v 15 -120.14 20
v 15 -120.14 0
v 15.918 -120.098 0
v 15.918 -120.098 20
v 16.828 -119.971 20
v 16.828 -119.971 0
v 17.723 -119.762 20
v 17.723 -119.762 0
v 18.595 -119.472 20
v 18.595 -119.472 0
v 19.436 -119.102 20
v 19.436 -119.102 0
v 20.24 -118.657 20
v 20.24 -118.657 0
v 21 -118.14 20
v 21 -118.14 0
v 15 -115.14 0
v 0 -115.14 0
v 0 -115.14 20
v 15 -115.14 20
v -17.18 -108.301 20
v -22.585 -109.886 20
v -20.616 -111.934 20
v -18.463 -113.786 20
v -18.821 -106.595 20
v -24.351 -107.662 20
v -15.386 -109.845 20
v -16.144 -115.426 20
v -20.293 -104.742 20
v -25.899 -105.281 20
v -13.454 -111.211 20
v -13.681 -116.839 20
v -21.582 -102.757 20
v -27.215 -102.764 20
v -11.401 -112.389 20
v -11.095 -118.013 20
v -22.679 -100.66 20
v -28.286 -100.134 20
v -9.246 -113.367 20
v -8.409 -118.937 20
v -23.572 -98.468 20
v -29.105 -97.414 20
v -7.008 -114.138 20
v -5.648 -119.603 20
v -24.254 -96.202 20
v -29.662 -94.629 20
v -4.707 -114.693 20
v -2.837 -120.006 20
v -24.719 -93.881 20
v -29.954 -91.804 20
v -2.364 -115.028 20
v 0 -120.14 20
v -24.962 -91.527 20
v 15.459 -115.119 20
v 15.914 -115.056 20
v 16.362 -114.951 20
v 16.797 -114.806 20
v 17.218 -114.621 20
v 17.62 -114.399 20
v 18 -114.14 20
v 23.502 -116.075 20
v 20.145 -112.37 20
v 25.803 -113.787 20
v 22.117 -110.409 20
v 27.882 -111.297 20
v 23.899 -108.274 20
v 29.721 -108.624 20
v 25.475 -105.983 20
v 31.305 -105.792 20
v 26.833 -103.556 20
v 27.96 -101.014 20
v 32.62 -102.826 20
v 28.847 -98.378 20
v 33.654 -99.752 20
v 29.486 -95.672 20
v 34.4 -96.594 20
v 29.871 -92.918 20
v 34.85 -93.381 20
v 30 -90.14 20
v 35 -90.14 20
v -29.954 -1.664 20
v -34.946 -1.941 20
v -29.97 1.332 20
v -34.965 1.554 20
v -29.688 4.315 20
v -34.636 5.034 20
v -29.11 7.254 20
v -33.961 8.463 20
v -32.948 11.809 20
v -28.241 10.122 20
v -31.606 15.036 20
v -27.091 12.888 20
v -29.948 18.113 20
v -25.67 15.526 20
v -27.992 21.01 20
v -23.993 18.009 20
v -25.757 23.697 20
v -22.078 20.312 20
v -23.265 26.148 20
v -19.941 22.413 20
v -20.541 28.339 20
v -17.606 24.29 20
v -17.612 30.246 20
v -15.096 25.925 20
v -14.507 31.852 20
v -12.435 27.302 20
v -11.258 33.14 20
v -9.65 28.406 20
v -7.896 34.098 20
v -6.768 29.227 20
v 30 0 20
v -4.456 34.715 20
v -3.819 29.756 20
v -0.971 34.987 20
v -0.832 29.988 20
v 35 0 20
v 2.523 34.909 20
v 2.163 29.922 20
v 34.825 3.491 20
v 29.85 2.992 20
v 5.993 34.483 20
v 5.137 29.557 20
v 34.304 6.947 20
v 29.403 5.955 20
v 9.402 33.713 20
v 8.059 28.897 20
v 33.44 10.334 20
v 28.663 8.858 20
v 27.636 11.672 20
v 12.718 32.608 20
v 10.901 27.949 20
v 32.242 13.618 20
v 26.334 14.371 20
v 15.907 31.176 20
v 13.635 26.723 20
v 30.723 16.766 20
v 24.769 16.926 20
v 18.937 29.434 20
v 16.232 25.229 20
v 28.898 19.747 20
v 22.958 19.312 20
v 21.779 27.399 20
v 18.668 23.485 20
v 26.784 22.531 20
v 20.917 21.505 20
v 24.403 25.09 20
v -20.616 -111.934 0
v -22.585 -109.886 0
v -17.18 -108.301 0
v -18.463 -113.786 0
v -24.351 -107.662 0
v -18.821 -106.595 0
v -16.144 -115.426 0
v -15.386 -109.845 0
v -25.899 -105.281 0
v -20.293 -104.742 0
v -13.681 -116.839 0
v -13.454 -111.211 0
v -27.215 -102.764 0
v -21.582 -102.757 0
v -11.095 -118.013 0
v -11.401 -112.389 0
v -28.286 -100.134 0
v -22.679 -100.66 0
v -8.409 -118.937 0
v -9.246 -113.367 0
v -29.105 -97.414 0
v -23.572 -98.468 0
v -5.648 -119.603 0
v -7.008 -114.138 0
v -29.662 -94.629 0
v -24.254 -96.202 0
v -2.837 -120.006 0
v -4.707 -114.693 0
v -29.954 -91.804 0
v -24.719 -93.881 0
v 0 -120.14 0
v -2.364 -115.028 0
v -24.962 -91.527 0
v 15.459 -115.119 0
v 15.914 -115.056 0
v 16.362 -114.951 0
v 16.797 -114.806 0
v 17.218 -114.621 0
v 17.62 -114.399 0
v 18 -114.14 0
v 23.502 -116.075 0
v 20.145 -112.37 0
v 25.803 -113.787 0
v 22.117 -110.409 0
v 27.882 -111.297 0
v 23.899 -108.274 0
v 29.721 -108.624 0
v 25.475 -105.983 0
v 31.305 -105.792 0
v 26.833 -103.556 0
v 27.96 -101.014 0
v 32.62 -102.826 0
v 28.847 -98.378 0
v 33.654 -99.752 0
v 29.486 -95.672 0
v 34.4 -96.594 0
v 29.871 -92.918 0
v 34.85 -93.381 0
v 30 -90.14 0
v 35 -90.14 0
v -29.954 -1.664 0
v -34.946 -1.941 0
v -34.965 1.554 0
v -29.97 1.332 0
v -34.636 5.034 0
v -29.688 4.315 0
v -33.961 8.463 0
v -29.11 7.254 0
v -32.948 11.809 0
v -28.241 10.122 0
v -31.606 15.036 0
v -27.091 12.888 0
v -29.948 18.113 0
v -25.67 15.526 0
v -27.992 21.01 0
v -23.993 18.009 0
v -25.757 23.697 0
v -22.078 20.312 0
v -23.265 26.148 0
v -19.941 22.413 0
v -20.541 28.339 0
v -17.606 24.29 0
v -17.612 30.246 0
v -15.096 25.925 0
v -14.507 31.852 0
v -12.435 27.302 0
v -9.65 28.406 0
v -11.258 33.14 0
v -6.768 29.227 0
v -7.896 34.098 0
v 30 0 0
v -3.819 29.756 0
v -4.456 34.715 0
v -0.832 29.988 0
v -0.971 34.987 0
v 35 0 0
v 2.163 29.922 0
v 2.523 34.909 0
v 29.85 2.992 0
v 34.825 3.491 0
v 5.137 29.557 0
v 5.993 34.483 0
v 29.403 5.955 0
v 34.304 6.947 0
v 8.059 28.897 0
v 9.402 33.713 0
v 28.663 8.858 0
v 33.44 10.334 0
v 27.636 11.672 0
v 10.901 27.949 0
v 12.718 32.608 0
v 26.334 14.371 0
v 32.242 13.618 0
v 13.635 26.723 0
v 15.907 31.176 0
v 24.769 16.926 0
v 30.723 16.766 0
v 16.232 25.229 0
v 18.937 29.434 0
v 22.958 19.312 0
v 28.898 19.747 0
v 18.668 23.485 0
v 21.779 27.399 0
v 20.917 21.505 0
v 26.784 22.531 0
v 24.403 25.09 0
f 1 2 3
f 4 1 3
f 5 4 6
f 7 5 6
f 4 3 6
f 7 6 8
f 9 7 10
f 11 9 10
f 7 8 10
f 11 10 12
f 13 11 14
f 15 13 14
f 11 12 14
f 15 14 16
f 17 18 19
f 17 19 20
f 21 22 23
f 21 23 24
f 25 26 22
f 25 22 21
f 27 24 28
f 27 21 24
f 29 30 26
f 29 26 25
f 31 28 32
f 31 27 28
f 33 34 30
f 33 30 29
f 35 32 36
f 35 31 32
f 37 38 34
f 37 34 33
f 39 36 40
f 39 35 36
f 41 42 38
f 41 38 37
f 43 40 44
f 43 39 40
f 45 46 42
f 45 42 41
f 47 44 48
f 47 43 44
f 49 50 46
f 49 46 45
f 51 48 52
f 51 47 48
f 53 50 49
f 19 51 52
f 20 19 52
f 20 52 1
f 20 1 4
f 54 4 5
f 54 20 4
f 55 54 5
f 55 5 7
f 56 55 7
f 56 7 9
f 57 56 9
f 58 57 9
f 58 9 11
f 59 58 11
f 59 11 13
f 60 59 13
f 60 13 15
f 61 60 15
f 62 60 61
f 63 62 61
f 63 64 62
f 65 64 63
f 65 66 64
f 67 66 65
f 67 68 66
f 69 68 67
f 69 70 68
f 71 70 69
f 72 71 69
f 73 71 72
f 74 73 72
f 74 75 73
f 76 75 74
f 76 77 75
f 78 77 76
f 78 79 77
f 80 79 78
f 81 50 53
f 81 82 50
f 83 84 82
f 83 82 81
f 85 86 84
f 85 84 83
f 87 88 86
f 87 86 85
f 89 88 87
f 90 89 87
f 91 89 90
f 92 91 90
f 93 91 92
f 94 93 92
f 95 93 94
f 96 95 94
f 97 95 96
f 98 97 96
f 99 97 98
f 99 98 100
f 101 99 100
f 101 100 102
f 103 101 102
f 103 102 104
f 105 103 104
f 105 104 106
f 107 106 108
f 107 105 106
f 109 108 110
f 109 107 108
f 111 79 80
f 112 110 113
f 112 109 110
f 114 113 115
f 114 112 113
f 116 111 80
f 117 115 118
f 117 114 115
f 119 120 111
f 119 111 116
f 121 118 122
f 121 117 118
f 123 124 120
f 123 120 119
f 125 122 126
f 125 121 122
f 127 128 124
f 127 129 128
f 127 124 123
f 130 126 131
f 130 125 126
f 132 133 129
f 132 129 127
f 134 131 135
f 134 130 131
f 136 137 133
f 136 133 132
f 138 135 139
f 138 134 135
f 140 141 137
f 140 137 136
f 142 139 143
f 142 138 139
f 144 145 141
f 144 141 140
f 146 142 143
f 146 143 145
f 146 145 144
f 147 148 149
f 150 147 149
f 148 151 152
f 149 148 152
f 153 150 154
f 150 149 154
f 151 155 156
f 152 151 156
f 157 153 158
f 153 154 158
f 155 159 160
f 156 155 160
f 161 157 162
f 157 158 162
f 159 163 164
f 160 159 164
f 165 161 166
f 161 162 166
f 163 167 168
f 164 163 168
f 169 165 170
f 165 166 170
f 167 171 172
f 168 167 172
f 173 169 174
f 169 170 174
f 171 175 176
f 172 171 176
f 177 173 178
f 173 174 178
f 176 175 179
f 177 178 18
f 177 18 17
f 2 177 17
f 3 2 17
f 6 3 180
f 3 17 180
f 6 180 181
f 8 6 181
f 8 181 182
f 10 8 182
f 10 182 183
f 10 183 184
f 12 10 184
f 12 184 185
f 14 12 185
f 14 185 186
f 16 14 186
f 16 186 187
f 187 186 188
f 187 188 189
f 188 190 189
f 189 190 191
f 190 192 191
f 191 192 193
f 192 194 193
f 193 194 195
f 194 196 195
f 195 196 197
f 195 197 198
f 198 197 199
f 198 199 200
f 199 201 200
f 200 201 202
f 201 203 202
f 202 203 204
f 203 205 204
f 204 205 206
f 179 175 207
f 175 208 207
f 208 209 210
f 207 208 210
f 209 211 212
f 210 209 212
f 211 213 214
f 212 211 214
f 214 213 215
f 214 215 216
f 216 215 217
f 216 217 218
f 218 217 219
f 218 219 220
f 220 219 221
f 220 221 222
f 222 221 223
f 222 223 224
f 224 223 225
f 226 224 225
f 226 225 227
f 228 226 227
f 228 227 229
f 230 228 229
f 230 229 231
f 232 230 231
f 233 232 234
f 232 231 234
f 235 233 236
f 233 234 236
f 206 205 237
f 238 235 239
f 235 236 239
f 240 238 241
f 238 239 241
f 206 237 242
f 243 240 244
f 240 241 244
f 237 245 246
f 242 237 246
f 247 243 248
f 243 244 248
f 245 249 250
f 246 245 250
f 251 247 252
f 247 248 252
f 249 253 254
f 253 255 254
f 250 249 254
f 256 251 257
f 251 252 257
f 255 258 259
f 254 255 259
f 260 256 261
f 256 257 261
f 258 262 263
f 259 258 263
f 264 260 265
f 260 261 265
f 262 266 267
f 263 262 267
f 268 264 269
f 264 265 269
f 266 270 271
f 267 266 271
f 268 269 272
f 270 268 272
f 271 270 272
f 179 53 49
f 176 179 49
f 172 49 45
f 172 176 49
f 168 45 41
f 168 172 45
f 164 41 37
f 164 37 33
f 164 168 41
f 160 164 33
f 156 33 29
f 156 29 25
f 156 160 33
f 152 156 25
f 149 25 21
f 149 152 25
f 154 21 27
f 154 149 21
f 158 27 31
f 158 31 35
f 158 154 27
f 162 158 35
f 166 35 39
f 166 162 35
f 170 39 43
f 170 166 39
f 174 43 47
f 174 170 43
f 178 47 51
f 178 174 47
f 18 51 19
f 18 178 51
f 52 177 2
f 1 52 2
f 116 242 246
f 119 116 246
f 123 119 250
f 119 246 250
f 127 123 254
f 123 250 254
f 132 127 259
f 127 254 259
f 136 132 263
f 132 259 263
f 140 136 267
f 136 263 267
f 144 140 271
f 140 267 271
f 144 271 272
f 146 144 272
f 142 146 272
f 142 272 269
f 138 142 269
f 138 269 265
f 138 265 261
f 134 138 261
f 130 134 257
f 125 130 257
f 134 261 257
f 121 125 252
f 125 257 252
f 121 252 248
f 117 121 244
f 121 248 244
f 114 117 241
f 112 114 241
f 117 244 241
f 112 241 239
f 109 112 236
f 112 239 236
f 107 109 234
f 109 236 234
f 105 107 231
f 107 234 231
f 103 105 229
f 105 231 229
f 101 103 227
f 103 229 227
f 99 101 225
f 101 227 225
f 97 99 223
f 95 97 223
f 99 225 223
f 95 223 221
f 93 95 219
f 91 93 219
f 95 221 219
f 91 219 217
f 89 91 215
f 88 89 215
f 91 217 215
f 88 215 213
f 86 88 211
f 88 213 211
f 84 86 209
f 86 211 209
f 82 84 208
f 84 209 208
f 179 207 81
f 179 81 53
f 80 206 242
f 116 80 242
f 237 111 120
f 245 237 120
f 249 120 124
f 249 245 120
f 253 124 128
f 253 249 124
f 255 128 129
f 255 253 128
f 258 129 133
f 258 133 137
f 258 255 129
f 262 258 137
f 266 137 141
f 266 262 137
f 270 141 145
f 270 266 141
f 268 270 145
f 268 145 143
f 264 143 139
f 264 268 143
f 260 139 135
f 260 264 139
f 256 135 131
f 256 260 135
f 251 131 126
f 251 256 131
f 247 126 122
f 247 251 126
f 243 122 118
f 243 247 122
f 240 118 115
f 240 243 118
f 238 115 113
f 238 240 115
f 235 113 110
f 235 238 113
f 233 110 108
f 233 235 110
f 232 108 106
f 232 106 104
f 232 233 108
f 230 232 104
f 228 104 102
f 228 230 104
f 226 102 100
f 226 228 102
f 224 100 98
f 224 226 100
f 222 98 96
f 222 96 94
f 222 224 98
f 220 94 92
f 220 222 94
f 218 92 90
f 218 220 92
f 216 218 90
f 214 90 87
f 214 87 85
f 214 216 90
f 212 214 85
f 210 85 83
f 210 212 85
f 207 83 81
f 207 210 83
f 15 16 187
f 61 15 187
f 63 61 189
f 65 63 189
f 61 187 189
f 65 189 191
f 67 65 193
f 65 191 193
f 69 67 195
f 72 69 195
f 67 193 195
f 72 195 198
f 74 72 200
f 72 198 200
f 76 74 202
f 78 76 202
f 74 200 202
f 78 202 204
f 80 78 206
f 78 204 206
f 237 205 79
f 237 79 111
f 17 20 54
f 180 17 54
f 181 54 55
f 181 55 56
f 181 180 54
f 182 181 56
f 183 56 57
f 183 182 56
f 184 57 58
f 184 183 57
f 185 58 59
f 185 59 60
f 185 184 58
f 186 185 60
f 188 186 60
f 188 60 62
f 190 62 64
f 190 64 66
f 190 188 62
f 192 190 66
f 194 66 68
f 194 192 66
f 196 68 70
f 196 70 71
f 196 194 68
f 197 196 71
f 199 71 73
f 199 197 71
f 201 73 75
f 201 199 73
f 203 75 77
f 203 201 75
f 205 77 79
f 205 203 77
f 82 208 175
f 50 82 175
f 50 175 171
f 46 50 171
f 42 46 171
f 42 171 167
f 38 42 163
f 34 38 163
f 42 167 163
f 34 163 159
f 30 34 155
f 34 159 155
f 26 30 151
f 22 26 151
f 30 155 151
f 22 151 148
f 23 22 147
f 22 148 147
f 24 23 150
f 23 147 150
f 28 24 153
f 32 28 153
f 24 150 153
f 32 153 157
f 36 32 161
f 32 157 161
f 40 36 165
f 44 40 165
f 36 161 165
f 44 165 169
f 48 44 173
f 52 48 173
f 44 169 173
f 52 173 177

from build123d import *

# Parameters (mm, degrees)
BOSS_EXTRUDE1_DEPTH = 20


with BuildPart() as part:
    # Sketch1 → Boss-Extrude1 (new body)
    with BuildSketch(Plane.XY):
        with BuildLine():
            Line((35, -90.14), (35, 0))
            ThreePointArc((35, 0), (-0.97108607, 34.986525861), (-34.94611382, -1.941424451))
            Line((-34.94611382, -1.941424451), (-29.953811845, -91.804078101))
            ThreePointArc((-29.953811845, -91.804078101), (-20.616469836, -111.933603913), (0, -120.14))
            Line((0, -120.14), (15, -120.14))
            ThreePointArc((15, -120.14), (18.16227766, -119.626832981), (21, -118.14))
            ThreePointArc((21, -118.14), (31.304951685, -105.792475842), (35, -90.14))
        make_face()
        with BuildLine():
            Line((30, -90.14), (30, 0))
            ThreePointArc((30, 0), (-0.832359488, 29.988450738), (-29.953811845, -1.664078101))
            Line((-29.953811845, -1.664078101), (-24.961509871, -91.526731751))
            ThreePointArc((-24.961509871, -91.526731751), (-17.18039153, -108.301336594), (0, -115.14))
            Line((0, -115.14), (15, -115.14))
            ThreePointArc((15, -115.14), (16.58113883, -114.88341649), (18, -114.14))
            ThreePointArc((18, -114.14), (26.83281573, -103.556407865), (30, -90.14))
        make_face(mode=Mode.SUBTRACT)
    extrude(amount=BOSS_EXTRUDE1_DEPTH)


solid = part.part
